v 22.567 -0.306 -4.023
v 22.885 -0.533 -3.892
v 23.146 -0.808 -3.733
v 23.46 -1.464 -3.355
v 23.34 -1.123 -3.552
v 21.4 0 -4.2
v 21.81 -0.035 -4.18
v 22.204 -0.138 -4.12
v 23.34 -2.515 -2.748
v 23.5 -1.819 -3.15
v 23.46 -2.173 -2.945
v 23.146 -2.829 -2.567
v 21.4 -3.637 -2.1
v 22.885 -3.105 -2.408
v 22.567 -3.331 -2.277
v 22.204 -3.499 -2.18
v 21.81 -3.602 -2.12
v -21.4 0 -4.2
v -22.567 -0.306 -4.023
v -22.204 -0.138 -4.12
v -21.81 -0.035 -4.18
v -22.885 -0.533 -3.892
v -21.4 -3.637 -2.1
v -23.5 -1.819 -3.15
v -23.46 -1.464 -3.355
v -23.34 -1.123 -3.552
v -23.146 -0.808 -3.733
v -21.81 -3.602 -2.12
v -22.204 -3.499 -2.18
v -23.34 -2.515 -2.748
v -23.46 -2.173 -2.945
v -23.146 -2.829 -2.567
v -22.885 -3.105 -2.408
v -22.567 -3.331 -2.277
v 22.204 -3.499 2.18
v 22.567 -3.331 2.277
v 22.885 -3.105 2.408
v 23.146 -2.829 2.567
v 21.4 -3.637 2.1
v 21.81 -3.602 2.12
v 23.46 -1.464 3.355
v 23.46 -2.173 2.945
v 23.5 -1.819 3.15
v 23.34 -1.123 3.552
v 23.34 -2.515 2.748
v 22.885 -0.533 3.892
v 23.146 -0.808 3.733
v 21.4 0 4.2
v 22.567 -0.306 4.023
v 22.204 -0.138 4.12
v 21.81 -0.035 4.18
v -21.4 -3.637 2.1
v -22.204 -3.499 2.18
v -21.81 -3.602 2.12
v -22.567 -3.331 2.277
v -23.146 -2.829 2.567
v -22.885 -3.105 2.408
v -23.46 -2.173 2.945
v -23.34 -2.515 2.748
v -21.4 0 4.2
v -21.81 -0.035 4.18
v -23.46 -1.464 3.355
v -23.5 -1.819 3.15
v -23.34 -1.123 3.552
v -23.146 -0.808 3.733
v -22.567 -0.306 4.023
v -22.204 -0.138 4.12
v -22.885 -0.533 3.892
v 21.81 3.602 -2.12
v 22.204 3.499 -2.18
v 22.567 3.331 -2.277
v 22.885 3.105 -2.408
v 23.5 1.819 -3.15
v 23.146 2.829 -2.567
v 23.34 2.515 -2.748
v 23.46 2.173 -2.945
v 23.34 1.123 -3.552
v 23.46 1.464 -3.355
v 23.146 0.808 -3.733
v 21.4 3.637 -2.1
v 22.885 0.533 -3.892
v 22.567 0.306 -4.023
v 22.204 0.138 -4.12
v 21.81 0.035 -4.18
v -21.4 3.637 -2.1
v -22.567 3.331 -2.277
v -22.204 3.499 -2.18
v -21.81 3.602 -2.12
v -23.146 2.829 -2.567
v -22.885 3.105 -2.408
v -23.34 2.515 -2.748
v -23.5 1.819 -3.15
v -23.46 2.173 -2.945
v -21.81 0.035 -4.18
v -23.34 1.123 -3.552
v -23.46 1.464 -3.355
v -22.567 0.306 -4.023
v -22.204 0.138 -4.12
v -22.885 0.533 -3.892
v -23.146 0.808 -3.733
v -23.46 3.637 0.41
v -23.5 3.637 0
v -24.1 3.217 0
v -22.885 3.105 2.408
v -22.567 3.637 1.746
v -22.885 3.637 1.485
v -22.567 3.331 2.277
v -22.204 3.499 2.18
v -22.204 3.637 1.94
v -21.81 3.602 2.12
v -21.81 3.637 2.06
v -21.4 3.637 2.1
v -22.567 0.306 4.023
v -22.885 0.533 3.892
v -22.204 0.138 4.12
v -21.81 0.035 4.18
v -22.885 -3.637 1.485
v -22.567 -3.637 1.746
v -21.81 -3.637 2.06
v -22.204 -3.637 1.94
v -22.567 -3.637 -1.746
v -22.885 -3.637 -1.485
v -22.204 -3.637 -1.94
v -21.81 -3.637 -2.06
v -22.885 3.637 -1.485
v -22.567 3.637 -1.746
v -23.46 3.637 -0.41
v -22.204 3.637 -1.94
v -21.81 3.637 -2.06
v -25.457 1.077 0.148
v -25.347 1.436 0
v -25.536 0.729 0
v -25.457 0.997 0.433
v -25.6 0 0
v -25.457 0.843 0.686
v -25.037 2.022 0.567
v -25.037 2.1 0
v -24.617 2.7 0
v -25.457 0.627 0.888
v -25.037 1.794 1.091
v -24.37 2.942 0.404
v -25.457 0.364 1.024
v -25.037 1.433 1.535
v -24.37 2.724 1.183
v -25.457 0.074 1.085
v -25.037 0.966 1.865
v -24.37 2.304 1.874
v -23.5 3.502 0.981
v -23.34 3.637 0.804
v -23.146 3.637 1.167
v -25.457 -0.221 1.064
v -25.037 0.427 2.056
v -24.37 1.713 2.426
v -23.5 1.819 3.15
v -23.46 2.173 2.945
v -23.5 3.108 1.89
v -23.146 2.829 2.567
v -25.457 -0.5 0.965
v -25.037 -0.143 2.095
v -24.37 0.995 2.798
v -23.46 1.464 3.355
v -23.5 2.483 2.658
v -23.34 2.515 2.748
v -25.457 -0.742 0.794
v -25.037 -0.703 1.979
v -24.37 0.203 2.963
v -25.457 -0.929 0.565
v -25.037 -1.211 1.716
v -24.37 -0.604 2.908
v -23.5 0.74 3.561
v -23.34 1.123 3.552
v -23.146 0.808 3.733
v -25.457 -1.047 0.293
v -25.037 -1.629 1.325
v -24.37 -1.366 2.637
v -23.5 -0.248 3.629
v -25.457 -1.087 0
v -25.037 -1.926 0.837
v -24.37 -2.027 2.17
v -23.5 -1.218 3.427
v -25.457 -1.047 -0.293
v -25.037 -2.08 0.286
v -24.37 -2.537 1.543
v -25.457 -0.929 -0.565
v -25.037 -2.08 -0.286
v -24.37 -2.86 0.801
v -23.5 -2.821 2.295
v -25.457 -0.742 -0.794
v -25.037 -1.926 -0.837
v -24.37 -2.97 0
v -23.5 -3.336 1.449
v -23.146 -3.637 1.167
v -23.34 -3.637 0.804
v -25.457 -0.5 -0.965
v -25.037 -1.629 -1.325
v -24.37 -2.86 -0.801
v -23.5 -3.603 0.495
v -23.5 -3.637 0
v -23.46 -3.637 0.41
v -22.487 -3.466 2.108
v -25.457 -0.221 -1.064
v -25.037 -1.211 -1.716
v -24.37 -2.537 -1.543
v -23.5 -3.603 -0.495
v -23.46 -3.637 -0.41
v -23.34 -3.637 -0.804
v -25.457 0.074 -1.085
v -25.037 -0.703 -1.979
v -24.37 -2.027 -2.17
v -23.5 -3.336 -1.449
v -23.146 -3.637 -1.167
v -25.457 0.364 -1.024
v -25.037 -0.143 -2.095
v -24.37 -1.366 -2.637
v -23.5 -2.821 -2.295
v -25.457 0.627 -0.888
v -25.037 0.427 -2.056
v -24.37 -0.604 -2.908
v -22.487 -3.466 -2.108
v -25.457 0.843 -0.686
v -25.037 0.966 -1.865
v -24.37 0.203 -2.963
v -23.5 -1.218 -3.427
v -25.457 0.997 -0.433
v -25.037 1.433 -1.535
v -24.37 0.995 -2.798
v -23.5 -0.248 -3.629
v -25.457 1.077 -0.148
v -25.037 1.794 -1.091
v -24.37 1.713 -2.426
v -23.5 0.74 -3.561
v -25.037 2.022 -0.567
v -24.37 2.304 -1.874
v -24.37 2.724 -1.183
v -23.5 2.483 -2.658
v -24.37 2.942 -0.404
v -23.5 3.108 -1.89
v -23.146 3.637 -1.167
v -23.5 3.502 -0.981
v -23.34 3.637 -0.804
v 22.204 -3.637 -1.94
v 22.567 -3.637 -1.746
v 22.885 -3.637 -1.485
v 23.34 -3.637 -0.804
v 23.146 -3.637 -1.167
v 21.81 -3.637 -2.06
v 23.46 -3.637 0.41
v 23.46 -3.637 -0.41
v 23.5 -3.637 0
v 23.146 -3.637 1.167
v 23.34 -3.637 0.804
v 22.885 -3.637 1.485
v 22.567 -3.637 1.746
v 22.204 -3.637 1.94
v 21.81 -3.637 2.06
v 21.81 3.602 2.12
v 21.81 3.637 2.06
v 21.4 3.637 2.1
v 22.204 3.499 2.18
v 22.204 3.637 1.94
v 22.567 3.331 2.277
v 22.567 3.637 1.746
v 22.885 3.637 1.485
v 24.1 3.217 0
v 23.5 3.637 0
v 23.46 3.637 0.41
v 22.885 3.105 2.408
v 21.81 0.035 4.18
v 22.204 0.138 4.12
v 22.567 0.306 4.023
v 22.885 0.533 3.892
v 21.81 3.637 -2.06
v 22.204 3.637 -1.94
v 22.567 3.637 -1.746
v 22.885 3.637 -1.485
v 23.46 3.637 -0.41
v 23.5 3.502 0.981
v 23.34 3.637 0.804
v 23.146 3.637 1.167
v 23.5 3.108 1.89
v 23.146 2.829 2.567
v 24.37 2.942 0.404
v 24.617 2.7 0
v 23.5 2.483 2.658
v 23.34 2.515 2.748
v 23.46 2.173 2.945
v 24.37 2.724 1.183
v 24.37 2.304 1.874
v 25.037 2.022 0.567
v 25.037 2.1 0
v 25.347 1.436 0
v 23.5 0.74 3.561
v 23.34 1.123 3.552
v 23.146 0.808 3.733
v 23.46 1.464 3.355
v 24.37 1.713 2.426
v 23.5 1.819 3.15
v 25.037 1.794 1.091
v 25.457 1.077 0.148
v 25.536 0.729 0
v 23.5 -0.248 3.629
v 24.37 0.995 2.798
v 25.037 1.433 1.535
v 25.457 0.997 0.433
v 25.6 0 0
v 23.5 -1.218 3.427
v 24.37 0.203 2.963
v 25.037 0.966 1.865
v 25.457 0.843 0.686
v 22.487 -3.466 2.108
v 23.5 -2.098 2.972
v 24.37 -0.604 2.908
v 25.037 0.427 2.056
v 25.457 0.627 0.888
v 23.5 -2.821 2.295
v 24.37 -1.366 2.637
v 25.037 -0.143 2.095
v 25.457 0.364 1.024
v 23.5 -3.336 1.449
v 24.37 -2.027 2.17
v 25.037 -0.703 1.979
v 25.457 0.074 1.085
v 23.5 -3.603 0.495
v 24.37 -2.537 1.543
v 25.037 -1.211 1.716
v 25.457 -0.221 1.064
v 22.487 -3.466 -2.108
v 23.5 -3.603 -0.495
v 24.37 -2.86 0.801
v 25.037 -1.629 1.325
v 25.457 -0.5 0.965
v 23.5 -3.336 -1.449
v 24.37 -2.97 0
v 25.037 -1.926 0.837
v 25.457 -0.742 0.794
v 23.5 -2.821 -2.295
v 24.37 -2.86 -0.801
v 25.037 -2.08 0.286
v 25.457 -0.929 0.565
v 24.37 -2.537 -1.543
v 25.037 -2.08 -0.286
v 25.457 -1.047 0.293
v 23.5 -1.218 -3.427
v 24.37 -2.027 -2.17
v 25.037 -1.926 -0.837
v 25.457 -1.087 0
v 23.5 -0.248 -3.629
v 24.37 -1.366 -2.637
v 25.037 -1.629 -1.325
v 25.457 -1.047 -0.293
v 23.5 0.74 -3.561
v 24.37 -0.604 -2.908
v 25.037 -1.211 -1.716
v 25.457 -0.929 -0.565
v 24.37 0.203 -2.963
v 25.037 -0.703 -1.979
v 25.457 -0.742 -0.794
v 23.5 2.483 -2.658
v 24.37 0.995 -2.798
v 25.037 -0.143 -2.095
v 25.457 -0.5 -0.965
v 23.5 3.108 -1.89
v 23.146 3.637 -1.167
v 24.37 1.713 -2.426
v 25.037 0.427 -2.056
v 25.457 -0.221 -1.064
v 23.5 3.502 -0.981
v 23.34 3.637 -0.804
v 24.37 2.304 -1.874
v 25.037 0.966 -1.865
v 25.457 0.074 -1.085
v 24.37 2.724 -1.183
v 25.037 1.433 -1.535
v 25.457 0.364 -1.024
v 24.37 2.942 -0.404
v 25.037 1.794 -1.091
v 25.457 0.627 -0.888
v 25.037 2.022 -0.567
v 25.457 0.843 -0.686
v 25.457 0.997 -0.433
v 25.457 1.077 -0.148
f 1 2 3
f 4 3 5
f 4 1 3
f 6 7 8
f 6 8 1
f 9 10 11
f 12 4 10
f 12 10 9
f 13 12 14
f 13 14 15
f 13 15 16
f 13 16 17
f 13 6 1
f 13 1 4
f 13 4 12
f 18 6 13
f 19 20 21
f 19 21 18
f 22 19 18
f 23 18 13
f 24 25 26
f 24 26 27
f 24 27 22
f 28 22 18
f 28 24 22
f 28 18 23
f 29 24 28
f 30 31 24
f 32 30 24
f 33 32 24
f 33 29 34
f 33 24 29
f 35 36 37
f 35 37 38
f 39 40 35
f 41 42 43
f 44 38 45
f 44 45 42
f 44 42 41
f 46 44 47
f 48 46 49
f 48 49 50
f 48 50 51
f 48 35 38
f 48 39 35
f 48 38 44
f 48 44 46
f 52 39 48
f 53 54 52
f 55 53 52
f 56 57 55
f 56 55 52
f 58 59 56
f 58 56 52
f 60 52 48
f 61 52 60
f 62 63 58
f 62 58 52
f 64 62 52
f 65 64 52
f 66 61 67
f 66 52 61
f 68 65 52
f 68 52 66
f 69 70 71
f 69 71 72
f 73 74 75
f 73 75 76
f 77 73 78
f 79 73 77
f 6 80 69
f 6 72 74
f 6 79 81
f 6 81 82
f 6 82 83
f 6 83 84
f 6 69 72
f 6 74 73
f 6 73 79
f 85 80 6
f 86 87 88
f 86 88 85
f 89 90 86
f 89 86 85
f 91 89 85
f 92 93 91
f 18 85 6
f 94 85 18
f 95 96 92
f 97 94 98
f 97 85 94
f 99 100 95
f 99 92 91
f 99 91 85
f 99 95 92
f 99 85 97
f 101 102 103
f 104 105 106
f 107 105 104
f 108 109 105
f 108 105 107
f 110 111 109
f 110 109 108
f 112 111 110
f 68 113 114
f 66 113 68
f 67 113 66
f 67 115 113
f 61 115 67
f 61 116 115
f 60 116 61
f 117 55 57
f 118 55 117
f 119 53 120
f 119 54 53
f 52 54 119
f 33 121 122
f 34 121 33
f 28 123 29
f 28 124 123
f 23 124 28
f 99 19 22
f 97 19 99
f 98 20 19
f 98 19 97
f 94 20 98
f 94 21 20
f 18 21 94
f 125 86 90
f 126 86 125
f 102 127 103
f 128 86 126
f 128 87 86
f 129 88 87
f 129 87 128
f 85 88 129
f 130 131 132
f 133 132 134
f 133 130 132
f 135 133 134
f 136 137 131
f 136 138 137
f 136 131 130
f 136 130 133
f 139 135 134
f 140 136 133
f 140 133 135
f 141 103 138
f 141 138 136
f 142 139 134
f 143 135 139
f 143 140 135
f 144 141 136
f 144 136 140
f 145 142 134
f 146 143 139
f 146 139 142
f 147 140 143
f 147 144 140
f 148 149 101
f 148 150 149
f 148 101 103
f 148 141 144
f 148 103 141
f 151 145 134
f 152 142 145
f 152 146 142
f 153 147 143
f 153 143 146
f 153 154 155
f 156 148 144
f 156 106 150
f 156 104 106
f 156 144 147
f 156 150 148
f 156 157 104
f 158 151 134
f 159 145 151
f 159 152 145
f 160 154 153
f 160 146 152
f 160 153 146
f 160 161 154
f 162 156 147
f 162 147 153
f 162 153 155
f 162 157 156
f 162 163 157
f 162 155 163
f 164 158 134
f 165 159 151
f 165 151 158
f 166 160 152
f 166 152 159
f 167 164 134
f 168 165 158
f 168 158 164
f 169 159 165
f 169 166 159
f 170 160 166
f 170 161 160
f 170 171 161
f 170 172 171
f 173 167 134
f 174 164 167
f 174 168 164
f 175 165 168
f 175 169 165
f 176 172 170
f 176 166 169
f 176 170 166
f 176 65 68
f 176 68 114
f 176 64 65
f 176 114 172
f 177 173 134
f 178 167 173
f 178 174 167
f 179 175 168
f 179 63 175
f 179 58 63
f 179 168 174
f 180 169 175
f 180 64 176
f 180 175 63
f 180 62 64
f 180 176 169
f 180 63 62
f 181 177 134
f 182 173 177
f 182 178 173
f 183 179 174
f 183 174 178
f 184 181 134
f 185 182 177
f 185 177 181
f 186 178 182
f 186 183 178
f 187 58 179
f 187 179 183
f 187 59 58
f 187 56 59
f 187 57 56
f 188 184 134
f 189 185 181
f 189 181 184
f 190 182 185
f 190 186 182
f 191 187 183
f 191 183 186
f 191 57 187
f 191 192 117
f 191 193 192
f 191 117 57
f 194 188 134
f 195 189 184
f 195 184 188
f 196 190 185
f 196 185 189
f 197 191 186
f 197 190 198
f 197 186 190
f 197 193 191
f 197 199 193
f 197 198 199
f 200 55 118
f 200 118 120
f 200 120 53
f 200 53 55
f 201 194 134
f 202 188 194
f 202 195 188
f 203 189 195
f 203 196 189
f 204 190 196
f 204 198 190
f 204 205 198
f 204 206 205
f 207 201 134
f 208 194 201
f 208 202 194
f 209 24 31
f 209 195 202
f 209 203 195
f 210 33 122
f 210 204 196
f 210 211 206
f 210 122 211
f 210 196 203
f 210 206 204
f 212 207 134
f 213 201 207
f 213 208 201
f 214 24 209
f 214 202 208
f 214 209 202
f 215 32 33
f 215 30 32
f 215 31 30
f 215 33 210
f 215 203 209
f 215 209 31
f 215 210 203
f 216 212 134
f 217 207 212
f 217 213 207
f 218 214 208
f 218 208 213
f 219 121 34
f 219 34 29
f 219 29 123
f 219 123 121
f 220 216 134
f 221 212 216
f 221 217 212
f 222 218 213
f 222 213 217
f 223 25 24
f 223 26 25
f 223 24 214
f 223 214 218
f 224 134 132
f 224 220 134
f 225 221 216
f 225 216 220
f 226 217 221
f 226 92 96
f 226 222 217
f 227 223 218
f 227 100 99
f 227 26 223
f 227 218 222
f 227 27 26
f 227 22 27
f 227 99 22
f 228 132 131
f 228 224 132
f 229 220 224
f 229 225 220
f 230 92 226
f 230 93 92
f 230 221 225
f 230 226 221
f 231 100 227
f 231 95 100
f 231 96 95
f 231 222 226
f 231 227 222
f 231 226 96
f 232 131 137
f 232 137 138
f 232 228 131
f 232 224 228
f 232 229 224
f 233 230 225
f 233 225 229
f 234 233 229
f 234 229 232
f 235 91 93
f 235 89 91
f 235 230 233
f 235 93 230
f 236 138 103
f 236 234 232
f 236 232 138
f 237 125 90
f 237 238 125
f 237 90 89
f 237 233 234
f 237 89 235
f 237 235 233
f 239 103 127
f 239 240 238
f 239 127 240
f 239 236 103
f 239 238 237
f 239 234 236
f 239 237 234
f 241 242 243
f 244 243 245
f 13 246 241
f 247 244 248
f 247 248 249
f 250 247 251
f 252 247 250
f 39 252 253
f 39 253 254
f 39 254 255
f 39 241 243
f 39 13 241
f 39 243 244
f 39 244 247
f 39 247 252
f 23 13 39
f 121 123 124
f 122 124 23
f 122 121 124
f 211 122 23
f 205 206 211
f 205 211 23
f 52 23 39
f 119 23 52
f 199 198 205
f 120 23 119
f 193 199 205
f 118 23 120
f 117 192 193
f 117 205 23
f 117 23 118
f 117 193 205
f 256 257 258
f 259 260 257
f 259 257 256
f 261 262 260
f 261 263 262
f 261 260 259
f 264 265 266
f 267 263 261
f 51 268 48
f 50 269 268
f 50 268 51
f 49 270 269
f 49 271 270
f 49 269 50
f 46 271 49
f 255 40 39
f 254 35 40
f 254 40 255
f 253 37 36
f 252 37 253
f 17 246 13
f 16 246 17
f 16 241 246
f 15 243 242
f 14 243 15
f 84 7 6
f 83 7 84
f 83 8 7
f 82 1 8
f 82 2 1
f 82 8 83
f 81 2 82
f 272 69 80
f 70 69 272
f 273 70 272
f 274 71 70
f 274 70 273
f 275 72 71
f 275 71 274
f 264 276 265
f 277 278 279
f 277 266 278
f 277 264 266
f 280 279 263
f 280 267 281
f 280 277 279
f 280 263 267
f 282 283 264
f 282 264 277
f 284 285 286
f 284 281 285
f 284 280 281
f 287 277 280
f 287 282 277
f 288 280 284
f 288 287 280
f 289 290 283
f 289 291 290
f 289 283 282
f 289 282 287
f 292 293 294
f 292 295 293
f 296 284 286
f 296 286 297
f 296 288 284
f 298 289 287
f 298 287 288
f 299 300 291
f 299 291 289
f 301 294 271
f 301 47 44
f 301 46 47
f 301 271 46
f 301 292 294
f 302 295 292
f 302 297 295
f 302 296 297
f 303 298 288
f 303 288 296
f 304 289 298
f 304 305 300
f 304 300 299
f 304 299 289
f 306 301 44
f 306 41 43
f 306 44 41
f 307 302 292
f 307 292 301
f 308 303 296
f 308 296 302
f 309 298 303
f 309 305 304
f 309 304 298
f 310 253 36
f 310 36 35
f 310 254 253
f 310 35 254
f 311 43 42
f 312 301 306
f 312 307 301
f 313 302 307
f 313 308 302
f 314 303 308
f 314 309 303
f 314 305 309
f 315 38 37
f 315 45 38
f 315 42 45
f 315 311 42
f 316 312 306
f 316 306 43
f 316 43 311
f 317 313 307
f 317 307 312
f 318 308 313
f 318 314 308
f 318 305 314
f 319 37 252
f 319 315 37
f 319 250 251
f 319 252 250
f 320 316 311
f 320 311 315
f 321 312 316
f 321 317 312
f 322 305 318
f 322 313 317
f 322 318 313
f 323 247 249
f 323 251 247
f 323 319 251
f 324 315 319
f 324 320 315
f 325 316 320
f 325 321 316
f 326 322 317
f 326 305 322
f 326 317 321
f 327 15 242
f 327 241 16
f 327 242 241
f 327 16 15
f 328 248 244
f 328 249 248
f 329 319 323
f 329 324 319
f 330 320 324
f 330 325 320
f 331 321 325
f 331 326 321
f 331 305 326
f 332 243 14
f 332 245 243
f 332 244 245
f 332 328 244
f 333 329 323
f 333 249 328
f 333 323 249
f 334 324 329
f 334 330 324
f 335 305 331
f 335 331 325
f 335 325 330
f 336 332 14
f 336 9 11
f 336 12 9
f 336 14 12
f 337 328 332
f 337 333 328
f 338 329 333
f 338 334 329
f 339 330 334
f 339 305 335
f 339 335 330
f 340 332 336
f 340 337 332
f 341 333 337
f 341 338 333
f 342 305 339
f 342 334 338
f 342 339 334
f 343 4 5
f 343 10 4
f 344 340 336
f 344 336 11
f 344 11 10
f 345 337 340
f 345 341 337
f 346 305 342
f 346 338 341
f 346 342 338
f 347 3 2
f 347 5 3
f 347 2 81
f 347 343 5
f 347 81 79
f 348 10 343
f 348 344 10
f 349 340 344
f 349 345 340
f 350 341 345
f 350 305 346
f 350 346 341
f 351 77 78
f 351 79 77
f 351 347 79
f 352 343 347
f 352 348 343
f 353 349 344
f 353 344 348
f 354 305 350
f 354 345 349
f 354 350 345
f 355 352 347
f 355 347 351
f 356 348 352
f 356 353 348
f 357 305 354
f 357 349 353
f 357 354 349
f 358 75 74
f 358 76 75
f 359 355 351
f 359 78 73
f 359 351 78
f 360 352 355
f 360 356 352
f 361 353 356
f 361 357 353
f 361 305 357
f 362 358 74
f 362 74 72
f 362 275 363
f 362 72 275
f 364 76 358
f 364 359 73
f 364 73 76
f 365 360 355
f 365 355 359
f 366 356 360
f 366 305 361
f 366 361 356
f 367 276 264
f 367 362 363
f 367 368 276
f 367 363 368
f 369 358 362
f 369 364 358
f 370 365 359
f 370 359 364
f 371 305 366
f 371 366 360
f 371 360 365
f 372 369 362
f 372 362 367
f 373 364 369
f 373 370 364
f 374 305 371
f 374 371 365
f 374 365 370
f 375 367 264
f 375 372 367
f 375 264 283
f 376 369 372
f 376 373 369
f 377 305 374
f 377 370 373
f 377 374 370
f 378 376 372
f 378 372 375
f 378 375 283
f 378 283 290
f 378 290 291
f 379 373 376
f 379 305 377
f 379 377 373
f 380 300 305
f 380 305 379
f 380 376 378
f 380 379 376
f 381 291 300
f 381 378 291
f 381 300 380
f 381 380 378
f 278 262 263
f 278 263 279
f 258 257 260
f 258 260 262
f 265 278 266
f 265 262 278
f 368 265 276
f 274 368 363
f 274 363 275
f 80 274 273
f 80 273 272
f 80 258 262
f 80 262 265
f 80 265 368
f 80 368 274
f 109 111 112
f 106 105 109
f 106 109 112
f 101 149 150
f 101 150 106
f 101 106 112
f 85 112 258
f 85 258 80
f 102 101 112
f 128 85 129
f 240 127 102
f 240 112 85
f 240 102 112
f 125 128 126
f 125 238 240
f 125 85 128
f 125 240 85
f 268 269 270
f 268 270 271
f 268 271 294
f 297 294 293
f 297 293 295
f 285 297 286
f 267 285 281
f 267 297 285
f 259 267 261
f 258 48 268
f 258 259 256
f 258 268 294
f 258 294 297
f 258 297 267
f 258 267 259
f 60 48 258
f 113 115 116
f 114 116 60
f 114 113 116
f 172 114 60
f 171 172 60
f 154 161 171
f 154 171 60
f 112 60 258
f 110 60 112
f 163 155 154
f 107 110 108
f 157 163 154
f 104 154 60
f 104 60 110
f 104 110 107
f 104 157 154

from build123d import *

# Parameters (mm, degrees)
OCTAGONAL_CUT_DEPTH      = 27.280030441382678
OCTAGONAL_CUT_DEPTH_BACK = 27.280030441382678


with BuildPart() as part:
    # Sketch1 → Body Revolve (revolve)
    with BuildSketch(Plane.XY):
        with BuildLine():
            Line((-21.400000000000002, 4.2), (21.400000000000002, 4.200000000000008))
            ThreePointArc((21.400000000000002, 4.200000000000008), (24.3698484809835, 2.9698484809835084), (25.6, 9.41e-15))
            Line((25.6, 9.41e-15), (-25.6, 0))
            ThreePointArc((-25.6, 0), (-24.369848480983503, 2.9698484809835), (-21.400000000000002, 4.2))
        make_face()
    revolve(axis=Axis((-25.6, 0, 0), (1, 1.8e-16, 0)))

    # Sketch2 → Octagonal Cut (cut, two sides: drawn at the far end of the back side and taken through both)
    with BuildSketch(Plane(origin=(0, 0, 0), x_dir=(0, 0, -1), z_dir=(1, 0, 0)).offset(-OCTAGONAL_CUT_DEPTH_BACK)):
        with BuildLine():
            Line((-4.1999999999999975, 8.44e-15), (-2.0999999999999983, 3.637306695894651))
            ThreePointArc((-2.099999999999999, 3.637306695894651), (-3.6373066958946416, 2.10000000000001), (-4.2, 9.15e-15))
        make_face()
        with BuildLine():
            ThreePointArc((2.1000000000000005, 3.6373066958946505), (2.6e-16, 4.200000000000009), (-2.099999999999999, 3.637306695894651))
            Line((-2.0999999999999983, 3.637306695894651), (2.1, 3.6373066958946496))
        make_face()
        with BuildLine():
            ThreePointArc((4.2, 8.63e-15), (3.6373066958946425, 2.100000000000008), (2.1000000000000005, 3.6373066958946505))
            Line((2.1, 3.6373066958946496), (4.199999999999999, 8.08e-15))
        make_face()
        with BuildLine():
            ThreePointArc((2.1000000000000005, -3.6373066958946336), (3.6373066958946434, -2.0999999999999903), (4.2, 7.61e-15))
            Line((4.199999999999999, 7.99e-15), (2.1, -3.6373066958946327))
        make_face()
        with BuildLine():
            Line((2.1000000000000005, -3.6373066958946327), (-2.0999999999999988, -3.637306695894634))
            ThreePointArc((-2.0999999999999983, -3.637306695894635), (-7.7e-16, -4.199999999999991), (2.1000000000000005, -3.6373066958946336))
        make_face()
        with BuildLine():
            Line((-2.0999999999999988, -3.637306695894634), (-4.1999999999999975, 8.2e-15))
            ThreePointArc((-4.2, 9.15e-15), (-3.637306695894642, -2.099999999999992), (-2.0999999999999983, -3.637306695894635))
        make_face()
    extrude(amount=OCTAGONAL_CUT_DEPTH + OCTAGONAL_CUT_DEPTH_BACK, mode=Mode.SUBTRACT)


solid = part.part
